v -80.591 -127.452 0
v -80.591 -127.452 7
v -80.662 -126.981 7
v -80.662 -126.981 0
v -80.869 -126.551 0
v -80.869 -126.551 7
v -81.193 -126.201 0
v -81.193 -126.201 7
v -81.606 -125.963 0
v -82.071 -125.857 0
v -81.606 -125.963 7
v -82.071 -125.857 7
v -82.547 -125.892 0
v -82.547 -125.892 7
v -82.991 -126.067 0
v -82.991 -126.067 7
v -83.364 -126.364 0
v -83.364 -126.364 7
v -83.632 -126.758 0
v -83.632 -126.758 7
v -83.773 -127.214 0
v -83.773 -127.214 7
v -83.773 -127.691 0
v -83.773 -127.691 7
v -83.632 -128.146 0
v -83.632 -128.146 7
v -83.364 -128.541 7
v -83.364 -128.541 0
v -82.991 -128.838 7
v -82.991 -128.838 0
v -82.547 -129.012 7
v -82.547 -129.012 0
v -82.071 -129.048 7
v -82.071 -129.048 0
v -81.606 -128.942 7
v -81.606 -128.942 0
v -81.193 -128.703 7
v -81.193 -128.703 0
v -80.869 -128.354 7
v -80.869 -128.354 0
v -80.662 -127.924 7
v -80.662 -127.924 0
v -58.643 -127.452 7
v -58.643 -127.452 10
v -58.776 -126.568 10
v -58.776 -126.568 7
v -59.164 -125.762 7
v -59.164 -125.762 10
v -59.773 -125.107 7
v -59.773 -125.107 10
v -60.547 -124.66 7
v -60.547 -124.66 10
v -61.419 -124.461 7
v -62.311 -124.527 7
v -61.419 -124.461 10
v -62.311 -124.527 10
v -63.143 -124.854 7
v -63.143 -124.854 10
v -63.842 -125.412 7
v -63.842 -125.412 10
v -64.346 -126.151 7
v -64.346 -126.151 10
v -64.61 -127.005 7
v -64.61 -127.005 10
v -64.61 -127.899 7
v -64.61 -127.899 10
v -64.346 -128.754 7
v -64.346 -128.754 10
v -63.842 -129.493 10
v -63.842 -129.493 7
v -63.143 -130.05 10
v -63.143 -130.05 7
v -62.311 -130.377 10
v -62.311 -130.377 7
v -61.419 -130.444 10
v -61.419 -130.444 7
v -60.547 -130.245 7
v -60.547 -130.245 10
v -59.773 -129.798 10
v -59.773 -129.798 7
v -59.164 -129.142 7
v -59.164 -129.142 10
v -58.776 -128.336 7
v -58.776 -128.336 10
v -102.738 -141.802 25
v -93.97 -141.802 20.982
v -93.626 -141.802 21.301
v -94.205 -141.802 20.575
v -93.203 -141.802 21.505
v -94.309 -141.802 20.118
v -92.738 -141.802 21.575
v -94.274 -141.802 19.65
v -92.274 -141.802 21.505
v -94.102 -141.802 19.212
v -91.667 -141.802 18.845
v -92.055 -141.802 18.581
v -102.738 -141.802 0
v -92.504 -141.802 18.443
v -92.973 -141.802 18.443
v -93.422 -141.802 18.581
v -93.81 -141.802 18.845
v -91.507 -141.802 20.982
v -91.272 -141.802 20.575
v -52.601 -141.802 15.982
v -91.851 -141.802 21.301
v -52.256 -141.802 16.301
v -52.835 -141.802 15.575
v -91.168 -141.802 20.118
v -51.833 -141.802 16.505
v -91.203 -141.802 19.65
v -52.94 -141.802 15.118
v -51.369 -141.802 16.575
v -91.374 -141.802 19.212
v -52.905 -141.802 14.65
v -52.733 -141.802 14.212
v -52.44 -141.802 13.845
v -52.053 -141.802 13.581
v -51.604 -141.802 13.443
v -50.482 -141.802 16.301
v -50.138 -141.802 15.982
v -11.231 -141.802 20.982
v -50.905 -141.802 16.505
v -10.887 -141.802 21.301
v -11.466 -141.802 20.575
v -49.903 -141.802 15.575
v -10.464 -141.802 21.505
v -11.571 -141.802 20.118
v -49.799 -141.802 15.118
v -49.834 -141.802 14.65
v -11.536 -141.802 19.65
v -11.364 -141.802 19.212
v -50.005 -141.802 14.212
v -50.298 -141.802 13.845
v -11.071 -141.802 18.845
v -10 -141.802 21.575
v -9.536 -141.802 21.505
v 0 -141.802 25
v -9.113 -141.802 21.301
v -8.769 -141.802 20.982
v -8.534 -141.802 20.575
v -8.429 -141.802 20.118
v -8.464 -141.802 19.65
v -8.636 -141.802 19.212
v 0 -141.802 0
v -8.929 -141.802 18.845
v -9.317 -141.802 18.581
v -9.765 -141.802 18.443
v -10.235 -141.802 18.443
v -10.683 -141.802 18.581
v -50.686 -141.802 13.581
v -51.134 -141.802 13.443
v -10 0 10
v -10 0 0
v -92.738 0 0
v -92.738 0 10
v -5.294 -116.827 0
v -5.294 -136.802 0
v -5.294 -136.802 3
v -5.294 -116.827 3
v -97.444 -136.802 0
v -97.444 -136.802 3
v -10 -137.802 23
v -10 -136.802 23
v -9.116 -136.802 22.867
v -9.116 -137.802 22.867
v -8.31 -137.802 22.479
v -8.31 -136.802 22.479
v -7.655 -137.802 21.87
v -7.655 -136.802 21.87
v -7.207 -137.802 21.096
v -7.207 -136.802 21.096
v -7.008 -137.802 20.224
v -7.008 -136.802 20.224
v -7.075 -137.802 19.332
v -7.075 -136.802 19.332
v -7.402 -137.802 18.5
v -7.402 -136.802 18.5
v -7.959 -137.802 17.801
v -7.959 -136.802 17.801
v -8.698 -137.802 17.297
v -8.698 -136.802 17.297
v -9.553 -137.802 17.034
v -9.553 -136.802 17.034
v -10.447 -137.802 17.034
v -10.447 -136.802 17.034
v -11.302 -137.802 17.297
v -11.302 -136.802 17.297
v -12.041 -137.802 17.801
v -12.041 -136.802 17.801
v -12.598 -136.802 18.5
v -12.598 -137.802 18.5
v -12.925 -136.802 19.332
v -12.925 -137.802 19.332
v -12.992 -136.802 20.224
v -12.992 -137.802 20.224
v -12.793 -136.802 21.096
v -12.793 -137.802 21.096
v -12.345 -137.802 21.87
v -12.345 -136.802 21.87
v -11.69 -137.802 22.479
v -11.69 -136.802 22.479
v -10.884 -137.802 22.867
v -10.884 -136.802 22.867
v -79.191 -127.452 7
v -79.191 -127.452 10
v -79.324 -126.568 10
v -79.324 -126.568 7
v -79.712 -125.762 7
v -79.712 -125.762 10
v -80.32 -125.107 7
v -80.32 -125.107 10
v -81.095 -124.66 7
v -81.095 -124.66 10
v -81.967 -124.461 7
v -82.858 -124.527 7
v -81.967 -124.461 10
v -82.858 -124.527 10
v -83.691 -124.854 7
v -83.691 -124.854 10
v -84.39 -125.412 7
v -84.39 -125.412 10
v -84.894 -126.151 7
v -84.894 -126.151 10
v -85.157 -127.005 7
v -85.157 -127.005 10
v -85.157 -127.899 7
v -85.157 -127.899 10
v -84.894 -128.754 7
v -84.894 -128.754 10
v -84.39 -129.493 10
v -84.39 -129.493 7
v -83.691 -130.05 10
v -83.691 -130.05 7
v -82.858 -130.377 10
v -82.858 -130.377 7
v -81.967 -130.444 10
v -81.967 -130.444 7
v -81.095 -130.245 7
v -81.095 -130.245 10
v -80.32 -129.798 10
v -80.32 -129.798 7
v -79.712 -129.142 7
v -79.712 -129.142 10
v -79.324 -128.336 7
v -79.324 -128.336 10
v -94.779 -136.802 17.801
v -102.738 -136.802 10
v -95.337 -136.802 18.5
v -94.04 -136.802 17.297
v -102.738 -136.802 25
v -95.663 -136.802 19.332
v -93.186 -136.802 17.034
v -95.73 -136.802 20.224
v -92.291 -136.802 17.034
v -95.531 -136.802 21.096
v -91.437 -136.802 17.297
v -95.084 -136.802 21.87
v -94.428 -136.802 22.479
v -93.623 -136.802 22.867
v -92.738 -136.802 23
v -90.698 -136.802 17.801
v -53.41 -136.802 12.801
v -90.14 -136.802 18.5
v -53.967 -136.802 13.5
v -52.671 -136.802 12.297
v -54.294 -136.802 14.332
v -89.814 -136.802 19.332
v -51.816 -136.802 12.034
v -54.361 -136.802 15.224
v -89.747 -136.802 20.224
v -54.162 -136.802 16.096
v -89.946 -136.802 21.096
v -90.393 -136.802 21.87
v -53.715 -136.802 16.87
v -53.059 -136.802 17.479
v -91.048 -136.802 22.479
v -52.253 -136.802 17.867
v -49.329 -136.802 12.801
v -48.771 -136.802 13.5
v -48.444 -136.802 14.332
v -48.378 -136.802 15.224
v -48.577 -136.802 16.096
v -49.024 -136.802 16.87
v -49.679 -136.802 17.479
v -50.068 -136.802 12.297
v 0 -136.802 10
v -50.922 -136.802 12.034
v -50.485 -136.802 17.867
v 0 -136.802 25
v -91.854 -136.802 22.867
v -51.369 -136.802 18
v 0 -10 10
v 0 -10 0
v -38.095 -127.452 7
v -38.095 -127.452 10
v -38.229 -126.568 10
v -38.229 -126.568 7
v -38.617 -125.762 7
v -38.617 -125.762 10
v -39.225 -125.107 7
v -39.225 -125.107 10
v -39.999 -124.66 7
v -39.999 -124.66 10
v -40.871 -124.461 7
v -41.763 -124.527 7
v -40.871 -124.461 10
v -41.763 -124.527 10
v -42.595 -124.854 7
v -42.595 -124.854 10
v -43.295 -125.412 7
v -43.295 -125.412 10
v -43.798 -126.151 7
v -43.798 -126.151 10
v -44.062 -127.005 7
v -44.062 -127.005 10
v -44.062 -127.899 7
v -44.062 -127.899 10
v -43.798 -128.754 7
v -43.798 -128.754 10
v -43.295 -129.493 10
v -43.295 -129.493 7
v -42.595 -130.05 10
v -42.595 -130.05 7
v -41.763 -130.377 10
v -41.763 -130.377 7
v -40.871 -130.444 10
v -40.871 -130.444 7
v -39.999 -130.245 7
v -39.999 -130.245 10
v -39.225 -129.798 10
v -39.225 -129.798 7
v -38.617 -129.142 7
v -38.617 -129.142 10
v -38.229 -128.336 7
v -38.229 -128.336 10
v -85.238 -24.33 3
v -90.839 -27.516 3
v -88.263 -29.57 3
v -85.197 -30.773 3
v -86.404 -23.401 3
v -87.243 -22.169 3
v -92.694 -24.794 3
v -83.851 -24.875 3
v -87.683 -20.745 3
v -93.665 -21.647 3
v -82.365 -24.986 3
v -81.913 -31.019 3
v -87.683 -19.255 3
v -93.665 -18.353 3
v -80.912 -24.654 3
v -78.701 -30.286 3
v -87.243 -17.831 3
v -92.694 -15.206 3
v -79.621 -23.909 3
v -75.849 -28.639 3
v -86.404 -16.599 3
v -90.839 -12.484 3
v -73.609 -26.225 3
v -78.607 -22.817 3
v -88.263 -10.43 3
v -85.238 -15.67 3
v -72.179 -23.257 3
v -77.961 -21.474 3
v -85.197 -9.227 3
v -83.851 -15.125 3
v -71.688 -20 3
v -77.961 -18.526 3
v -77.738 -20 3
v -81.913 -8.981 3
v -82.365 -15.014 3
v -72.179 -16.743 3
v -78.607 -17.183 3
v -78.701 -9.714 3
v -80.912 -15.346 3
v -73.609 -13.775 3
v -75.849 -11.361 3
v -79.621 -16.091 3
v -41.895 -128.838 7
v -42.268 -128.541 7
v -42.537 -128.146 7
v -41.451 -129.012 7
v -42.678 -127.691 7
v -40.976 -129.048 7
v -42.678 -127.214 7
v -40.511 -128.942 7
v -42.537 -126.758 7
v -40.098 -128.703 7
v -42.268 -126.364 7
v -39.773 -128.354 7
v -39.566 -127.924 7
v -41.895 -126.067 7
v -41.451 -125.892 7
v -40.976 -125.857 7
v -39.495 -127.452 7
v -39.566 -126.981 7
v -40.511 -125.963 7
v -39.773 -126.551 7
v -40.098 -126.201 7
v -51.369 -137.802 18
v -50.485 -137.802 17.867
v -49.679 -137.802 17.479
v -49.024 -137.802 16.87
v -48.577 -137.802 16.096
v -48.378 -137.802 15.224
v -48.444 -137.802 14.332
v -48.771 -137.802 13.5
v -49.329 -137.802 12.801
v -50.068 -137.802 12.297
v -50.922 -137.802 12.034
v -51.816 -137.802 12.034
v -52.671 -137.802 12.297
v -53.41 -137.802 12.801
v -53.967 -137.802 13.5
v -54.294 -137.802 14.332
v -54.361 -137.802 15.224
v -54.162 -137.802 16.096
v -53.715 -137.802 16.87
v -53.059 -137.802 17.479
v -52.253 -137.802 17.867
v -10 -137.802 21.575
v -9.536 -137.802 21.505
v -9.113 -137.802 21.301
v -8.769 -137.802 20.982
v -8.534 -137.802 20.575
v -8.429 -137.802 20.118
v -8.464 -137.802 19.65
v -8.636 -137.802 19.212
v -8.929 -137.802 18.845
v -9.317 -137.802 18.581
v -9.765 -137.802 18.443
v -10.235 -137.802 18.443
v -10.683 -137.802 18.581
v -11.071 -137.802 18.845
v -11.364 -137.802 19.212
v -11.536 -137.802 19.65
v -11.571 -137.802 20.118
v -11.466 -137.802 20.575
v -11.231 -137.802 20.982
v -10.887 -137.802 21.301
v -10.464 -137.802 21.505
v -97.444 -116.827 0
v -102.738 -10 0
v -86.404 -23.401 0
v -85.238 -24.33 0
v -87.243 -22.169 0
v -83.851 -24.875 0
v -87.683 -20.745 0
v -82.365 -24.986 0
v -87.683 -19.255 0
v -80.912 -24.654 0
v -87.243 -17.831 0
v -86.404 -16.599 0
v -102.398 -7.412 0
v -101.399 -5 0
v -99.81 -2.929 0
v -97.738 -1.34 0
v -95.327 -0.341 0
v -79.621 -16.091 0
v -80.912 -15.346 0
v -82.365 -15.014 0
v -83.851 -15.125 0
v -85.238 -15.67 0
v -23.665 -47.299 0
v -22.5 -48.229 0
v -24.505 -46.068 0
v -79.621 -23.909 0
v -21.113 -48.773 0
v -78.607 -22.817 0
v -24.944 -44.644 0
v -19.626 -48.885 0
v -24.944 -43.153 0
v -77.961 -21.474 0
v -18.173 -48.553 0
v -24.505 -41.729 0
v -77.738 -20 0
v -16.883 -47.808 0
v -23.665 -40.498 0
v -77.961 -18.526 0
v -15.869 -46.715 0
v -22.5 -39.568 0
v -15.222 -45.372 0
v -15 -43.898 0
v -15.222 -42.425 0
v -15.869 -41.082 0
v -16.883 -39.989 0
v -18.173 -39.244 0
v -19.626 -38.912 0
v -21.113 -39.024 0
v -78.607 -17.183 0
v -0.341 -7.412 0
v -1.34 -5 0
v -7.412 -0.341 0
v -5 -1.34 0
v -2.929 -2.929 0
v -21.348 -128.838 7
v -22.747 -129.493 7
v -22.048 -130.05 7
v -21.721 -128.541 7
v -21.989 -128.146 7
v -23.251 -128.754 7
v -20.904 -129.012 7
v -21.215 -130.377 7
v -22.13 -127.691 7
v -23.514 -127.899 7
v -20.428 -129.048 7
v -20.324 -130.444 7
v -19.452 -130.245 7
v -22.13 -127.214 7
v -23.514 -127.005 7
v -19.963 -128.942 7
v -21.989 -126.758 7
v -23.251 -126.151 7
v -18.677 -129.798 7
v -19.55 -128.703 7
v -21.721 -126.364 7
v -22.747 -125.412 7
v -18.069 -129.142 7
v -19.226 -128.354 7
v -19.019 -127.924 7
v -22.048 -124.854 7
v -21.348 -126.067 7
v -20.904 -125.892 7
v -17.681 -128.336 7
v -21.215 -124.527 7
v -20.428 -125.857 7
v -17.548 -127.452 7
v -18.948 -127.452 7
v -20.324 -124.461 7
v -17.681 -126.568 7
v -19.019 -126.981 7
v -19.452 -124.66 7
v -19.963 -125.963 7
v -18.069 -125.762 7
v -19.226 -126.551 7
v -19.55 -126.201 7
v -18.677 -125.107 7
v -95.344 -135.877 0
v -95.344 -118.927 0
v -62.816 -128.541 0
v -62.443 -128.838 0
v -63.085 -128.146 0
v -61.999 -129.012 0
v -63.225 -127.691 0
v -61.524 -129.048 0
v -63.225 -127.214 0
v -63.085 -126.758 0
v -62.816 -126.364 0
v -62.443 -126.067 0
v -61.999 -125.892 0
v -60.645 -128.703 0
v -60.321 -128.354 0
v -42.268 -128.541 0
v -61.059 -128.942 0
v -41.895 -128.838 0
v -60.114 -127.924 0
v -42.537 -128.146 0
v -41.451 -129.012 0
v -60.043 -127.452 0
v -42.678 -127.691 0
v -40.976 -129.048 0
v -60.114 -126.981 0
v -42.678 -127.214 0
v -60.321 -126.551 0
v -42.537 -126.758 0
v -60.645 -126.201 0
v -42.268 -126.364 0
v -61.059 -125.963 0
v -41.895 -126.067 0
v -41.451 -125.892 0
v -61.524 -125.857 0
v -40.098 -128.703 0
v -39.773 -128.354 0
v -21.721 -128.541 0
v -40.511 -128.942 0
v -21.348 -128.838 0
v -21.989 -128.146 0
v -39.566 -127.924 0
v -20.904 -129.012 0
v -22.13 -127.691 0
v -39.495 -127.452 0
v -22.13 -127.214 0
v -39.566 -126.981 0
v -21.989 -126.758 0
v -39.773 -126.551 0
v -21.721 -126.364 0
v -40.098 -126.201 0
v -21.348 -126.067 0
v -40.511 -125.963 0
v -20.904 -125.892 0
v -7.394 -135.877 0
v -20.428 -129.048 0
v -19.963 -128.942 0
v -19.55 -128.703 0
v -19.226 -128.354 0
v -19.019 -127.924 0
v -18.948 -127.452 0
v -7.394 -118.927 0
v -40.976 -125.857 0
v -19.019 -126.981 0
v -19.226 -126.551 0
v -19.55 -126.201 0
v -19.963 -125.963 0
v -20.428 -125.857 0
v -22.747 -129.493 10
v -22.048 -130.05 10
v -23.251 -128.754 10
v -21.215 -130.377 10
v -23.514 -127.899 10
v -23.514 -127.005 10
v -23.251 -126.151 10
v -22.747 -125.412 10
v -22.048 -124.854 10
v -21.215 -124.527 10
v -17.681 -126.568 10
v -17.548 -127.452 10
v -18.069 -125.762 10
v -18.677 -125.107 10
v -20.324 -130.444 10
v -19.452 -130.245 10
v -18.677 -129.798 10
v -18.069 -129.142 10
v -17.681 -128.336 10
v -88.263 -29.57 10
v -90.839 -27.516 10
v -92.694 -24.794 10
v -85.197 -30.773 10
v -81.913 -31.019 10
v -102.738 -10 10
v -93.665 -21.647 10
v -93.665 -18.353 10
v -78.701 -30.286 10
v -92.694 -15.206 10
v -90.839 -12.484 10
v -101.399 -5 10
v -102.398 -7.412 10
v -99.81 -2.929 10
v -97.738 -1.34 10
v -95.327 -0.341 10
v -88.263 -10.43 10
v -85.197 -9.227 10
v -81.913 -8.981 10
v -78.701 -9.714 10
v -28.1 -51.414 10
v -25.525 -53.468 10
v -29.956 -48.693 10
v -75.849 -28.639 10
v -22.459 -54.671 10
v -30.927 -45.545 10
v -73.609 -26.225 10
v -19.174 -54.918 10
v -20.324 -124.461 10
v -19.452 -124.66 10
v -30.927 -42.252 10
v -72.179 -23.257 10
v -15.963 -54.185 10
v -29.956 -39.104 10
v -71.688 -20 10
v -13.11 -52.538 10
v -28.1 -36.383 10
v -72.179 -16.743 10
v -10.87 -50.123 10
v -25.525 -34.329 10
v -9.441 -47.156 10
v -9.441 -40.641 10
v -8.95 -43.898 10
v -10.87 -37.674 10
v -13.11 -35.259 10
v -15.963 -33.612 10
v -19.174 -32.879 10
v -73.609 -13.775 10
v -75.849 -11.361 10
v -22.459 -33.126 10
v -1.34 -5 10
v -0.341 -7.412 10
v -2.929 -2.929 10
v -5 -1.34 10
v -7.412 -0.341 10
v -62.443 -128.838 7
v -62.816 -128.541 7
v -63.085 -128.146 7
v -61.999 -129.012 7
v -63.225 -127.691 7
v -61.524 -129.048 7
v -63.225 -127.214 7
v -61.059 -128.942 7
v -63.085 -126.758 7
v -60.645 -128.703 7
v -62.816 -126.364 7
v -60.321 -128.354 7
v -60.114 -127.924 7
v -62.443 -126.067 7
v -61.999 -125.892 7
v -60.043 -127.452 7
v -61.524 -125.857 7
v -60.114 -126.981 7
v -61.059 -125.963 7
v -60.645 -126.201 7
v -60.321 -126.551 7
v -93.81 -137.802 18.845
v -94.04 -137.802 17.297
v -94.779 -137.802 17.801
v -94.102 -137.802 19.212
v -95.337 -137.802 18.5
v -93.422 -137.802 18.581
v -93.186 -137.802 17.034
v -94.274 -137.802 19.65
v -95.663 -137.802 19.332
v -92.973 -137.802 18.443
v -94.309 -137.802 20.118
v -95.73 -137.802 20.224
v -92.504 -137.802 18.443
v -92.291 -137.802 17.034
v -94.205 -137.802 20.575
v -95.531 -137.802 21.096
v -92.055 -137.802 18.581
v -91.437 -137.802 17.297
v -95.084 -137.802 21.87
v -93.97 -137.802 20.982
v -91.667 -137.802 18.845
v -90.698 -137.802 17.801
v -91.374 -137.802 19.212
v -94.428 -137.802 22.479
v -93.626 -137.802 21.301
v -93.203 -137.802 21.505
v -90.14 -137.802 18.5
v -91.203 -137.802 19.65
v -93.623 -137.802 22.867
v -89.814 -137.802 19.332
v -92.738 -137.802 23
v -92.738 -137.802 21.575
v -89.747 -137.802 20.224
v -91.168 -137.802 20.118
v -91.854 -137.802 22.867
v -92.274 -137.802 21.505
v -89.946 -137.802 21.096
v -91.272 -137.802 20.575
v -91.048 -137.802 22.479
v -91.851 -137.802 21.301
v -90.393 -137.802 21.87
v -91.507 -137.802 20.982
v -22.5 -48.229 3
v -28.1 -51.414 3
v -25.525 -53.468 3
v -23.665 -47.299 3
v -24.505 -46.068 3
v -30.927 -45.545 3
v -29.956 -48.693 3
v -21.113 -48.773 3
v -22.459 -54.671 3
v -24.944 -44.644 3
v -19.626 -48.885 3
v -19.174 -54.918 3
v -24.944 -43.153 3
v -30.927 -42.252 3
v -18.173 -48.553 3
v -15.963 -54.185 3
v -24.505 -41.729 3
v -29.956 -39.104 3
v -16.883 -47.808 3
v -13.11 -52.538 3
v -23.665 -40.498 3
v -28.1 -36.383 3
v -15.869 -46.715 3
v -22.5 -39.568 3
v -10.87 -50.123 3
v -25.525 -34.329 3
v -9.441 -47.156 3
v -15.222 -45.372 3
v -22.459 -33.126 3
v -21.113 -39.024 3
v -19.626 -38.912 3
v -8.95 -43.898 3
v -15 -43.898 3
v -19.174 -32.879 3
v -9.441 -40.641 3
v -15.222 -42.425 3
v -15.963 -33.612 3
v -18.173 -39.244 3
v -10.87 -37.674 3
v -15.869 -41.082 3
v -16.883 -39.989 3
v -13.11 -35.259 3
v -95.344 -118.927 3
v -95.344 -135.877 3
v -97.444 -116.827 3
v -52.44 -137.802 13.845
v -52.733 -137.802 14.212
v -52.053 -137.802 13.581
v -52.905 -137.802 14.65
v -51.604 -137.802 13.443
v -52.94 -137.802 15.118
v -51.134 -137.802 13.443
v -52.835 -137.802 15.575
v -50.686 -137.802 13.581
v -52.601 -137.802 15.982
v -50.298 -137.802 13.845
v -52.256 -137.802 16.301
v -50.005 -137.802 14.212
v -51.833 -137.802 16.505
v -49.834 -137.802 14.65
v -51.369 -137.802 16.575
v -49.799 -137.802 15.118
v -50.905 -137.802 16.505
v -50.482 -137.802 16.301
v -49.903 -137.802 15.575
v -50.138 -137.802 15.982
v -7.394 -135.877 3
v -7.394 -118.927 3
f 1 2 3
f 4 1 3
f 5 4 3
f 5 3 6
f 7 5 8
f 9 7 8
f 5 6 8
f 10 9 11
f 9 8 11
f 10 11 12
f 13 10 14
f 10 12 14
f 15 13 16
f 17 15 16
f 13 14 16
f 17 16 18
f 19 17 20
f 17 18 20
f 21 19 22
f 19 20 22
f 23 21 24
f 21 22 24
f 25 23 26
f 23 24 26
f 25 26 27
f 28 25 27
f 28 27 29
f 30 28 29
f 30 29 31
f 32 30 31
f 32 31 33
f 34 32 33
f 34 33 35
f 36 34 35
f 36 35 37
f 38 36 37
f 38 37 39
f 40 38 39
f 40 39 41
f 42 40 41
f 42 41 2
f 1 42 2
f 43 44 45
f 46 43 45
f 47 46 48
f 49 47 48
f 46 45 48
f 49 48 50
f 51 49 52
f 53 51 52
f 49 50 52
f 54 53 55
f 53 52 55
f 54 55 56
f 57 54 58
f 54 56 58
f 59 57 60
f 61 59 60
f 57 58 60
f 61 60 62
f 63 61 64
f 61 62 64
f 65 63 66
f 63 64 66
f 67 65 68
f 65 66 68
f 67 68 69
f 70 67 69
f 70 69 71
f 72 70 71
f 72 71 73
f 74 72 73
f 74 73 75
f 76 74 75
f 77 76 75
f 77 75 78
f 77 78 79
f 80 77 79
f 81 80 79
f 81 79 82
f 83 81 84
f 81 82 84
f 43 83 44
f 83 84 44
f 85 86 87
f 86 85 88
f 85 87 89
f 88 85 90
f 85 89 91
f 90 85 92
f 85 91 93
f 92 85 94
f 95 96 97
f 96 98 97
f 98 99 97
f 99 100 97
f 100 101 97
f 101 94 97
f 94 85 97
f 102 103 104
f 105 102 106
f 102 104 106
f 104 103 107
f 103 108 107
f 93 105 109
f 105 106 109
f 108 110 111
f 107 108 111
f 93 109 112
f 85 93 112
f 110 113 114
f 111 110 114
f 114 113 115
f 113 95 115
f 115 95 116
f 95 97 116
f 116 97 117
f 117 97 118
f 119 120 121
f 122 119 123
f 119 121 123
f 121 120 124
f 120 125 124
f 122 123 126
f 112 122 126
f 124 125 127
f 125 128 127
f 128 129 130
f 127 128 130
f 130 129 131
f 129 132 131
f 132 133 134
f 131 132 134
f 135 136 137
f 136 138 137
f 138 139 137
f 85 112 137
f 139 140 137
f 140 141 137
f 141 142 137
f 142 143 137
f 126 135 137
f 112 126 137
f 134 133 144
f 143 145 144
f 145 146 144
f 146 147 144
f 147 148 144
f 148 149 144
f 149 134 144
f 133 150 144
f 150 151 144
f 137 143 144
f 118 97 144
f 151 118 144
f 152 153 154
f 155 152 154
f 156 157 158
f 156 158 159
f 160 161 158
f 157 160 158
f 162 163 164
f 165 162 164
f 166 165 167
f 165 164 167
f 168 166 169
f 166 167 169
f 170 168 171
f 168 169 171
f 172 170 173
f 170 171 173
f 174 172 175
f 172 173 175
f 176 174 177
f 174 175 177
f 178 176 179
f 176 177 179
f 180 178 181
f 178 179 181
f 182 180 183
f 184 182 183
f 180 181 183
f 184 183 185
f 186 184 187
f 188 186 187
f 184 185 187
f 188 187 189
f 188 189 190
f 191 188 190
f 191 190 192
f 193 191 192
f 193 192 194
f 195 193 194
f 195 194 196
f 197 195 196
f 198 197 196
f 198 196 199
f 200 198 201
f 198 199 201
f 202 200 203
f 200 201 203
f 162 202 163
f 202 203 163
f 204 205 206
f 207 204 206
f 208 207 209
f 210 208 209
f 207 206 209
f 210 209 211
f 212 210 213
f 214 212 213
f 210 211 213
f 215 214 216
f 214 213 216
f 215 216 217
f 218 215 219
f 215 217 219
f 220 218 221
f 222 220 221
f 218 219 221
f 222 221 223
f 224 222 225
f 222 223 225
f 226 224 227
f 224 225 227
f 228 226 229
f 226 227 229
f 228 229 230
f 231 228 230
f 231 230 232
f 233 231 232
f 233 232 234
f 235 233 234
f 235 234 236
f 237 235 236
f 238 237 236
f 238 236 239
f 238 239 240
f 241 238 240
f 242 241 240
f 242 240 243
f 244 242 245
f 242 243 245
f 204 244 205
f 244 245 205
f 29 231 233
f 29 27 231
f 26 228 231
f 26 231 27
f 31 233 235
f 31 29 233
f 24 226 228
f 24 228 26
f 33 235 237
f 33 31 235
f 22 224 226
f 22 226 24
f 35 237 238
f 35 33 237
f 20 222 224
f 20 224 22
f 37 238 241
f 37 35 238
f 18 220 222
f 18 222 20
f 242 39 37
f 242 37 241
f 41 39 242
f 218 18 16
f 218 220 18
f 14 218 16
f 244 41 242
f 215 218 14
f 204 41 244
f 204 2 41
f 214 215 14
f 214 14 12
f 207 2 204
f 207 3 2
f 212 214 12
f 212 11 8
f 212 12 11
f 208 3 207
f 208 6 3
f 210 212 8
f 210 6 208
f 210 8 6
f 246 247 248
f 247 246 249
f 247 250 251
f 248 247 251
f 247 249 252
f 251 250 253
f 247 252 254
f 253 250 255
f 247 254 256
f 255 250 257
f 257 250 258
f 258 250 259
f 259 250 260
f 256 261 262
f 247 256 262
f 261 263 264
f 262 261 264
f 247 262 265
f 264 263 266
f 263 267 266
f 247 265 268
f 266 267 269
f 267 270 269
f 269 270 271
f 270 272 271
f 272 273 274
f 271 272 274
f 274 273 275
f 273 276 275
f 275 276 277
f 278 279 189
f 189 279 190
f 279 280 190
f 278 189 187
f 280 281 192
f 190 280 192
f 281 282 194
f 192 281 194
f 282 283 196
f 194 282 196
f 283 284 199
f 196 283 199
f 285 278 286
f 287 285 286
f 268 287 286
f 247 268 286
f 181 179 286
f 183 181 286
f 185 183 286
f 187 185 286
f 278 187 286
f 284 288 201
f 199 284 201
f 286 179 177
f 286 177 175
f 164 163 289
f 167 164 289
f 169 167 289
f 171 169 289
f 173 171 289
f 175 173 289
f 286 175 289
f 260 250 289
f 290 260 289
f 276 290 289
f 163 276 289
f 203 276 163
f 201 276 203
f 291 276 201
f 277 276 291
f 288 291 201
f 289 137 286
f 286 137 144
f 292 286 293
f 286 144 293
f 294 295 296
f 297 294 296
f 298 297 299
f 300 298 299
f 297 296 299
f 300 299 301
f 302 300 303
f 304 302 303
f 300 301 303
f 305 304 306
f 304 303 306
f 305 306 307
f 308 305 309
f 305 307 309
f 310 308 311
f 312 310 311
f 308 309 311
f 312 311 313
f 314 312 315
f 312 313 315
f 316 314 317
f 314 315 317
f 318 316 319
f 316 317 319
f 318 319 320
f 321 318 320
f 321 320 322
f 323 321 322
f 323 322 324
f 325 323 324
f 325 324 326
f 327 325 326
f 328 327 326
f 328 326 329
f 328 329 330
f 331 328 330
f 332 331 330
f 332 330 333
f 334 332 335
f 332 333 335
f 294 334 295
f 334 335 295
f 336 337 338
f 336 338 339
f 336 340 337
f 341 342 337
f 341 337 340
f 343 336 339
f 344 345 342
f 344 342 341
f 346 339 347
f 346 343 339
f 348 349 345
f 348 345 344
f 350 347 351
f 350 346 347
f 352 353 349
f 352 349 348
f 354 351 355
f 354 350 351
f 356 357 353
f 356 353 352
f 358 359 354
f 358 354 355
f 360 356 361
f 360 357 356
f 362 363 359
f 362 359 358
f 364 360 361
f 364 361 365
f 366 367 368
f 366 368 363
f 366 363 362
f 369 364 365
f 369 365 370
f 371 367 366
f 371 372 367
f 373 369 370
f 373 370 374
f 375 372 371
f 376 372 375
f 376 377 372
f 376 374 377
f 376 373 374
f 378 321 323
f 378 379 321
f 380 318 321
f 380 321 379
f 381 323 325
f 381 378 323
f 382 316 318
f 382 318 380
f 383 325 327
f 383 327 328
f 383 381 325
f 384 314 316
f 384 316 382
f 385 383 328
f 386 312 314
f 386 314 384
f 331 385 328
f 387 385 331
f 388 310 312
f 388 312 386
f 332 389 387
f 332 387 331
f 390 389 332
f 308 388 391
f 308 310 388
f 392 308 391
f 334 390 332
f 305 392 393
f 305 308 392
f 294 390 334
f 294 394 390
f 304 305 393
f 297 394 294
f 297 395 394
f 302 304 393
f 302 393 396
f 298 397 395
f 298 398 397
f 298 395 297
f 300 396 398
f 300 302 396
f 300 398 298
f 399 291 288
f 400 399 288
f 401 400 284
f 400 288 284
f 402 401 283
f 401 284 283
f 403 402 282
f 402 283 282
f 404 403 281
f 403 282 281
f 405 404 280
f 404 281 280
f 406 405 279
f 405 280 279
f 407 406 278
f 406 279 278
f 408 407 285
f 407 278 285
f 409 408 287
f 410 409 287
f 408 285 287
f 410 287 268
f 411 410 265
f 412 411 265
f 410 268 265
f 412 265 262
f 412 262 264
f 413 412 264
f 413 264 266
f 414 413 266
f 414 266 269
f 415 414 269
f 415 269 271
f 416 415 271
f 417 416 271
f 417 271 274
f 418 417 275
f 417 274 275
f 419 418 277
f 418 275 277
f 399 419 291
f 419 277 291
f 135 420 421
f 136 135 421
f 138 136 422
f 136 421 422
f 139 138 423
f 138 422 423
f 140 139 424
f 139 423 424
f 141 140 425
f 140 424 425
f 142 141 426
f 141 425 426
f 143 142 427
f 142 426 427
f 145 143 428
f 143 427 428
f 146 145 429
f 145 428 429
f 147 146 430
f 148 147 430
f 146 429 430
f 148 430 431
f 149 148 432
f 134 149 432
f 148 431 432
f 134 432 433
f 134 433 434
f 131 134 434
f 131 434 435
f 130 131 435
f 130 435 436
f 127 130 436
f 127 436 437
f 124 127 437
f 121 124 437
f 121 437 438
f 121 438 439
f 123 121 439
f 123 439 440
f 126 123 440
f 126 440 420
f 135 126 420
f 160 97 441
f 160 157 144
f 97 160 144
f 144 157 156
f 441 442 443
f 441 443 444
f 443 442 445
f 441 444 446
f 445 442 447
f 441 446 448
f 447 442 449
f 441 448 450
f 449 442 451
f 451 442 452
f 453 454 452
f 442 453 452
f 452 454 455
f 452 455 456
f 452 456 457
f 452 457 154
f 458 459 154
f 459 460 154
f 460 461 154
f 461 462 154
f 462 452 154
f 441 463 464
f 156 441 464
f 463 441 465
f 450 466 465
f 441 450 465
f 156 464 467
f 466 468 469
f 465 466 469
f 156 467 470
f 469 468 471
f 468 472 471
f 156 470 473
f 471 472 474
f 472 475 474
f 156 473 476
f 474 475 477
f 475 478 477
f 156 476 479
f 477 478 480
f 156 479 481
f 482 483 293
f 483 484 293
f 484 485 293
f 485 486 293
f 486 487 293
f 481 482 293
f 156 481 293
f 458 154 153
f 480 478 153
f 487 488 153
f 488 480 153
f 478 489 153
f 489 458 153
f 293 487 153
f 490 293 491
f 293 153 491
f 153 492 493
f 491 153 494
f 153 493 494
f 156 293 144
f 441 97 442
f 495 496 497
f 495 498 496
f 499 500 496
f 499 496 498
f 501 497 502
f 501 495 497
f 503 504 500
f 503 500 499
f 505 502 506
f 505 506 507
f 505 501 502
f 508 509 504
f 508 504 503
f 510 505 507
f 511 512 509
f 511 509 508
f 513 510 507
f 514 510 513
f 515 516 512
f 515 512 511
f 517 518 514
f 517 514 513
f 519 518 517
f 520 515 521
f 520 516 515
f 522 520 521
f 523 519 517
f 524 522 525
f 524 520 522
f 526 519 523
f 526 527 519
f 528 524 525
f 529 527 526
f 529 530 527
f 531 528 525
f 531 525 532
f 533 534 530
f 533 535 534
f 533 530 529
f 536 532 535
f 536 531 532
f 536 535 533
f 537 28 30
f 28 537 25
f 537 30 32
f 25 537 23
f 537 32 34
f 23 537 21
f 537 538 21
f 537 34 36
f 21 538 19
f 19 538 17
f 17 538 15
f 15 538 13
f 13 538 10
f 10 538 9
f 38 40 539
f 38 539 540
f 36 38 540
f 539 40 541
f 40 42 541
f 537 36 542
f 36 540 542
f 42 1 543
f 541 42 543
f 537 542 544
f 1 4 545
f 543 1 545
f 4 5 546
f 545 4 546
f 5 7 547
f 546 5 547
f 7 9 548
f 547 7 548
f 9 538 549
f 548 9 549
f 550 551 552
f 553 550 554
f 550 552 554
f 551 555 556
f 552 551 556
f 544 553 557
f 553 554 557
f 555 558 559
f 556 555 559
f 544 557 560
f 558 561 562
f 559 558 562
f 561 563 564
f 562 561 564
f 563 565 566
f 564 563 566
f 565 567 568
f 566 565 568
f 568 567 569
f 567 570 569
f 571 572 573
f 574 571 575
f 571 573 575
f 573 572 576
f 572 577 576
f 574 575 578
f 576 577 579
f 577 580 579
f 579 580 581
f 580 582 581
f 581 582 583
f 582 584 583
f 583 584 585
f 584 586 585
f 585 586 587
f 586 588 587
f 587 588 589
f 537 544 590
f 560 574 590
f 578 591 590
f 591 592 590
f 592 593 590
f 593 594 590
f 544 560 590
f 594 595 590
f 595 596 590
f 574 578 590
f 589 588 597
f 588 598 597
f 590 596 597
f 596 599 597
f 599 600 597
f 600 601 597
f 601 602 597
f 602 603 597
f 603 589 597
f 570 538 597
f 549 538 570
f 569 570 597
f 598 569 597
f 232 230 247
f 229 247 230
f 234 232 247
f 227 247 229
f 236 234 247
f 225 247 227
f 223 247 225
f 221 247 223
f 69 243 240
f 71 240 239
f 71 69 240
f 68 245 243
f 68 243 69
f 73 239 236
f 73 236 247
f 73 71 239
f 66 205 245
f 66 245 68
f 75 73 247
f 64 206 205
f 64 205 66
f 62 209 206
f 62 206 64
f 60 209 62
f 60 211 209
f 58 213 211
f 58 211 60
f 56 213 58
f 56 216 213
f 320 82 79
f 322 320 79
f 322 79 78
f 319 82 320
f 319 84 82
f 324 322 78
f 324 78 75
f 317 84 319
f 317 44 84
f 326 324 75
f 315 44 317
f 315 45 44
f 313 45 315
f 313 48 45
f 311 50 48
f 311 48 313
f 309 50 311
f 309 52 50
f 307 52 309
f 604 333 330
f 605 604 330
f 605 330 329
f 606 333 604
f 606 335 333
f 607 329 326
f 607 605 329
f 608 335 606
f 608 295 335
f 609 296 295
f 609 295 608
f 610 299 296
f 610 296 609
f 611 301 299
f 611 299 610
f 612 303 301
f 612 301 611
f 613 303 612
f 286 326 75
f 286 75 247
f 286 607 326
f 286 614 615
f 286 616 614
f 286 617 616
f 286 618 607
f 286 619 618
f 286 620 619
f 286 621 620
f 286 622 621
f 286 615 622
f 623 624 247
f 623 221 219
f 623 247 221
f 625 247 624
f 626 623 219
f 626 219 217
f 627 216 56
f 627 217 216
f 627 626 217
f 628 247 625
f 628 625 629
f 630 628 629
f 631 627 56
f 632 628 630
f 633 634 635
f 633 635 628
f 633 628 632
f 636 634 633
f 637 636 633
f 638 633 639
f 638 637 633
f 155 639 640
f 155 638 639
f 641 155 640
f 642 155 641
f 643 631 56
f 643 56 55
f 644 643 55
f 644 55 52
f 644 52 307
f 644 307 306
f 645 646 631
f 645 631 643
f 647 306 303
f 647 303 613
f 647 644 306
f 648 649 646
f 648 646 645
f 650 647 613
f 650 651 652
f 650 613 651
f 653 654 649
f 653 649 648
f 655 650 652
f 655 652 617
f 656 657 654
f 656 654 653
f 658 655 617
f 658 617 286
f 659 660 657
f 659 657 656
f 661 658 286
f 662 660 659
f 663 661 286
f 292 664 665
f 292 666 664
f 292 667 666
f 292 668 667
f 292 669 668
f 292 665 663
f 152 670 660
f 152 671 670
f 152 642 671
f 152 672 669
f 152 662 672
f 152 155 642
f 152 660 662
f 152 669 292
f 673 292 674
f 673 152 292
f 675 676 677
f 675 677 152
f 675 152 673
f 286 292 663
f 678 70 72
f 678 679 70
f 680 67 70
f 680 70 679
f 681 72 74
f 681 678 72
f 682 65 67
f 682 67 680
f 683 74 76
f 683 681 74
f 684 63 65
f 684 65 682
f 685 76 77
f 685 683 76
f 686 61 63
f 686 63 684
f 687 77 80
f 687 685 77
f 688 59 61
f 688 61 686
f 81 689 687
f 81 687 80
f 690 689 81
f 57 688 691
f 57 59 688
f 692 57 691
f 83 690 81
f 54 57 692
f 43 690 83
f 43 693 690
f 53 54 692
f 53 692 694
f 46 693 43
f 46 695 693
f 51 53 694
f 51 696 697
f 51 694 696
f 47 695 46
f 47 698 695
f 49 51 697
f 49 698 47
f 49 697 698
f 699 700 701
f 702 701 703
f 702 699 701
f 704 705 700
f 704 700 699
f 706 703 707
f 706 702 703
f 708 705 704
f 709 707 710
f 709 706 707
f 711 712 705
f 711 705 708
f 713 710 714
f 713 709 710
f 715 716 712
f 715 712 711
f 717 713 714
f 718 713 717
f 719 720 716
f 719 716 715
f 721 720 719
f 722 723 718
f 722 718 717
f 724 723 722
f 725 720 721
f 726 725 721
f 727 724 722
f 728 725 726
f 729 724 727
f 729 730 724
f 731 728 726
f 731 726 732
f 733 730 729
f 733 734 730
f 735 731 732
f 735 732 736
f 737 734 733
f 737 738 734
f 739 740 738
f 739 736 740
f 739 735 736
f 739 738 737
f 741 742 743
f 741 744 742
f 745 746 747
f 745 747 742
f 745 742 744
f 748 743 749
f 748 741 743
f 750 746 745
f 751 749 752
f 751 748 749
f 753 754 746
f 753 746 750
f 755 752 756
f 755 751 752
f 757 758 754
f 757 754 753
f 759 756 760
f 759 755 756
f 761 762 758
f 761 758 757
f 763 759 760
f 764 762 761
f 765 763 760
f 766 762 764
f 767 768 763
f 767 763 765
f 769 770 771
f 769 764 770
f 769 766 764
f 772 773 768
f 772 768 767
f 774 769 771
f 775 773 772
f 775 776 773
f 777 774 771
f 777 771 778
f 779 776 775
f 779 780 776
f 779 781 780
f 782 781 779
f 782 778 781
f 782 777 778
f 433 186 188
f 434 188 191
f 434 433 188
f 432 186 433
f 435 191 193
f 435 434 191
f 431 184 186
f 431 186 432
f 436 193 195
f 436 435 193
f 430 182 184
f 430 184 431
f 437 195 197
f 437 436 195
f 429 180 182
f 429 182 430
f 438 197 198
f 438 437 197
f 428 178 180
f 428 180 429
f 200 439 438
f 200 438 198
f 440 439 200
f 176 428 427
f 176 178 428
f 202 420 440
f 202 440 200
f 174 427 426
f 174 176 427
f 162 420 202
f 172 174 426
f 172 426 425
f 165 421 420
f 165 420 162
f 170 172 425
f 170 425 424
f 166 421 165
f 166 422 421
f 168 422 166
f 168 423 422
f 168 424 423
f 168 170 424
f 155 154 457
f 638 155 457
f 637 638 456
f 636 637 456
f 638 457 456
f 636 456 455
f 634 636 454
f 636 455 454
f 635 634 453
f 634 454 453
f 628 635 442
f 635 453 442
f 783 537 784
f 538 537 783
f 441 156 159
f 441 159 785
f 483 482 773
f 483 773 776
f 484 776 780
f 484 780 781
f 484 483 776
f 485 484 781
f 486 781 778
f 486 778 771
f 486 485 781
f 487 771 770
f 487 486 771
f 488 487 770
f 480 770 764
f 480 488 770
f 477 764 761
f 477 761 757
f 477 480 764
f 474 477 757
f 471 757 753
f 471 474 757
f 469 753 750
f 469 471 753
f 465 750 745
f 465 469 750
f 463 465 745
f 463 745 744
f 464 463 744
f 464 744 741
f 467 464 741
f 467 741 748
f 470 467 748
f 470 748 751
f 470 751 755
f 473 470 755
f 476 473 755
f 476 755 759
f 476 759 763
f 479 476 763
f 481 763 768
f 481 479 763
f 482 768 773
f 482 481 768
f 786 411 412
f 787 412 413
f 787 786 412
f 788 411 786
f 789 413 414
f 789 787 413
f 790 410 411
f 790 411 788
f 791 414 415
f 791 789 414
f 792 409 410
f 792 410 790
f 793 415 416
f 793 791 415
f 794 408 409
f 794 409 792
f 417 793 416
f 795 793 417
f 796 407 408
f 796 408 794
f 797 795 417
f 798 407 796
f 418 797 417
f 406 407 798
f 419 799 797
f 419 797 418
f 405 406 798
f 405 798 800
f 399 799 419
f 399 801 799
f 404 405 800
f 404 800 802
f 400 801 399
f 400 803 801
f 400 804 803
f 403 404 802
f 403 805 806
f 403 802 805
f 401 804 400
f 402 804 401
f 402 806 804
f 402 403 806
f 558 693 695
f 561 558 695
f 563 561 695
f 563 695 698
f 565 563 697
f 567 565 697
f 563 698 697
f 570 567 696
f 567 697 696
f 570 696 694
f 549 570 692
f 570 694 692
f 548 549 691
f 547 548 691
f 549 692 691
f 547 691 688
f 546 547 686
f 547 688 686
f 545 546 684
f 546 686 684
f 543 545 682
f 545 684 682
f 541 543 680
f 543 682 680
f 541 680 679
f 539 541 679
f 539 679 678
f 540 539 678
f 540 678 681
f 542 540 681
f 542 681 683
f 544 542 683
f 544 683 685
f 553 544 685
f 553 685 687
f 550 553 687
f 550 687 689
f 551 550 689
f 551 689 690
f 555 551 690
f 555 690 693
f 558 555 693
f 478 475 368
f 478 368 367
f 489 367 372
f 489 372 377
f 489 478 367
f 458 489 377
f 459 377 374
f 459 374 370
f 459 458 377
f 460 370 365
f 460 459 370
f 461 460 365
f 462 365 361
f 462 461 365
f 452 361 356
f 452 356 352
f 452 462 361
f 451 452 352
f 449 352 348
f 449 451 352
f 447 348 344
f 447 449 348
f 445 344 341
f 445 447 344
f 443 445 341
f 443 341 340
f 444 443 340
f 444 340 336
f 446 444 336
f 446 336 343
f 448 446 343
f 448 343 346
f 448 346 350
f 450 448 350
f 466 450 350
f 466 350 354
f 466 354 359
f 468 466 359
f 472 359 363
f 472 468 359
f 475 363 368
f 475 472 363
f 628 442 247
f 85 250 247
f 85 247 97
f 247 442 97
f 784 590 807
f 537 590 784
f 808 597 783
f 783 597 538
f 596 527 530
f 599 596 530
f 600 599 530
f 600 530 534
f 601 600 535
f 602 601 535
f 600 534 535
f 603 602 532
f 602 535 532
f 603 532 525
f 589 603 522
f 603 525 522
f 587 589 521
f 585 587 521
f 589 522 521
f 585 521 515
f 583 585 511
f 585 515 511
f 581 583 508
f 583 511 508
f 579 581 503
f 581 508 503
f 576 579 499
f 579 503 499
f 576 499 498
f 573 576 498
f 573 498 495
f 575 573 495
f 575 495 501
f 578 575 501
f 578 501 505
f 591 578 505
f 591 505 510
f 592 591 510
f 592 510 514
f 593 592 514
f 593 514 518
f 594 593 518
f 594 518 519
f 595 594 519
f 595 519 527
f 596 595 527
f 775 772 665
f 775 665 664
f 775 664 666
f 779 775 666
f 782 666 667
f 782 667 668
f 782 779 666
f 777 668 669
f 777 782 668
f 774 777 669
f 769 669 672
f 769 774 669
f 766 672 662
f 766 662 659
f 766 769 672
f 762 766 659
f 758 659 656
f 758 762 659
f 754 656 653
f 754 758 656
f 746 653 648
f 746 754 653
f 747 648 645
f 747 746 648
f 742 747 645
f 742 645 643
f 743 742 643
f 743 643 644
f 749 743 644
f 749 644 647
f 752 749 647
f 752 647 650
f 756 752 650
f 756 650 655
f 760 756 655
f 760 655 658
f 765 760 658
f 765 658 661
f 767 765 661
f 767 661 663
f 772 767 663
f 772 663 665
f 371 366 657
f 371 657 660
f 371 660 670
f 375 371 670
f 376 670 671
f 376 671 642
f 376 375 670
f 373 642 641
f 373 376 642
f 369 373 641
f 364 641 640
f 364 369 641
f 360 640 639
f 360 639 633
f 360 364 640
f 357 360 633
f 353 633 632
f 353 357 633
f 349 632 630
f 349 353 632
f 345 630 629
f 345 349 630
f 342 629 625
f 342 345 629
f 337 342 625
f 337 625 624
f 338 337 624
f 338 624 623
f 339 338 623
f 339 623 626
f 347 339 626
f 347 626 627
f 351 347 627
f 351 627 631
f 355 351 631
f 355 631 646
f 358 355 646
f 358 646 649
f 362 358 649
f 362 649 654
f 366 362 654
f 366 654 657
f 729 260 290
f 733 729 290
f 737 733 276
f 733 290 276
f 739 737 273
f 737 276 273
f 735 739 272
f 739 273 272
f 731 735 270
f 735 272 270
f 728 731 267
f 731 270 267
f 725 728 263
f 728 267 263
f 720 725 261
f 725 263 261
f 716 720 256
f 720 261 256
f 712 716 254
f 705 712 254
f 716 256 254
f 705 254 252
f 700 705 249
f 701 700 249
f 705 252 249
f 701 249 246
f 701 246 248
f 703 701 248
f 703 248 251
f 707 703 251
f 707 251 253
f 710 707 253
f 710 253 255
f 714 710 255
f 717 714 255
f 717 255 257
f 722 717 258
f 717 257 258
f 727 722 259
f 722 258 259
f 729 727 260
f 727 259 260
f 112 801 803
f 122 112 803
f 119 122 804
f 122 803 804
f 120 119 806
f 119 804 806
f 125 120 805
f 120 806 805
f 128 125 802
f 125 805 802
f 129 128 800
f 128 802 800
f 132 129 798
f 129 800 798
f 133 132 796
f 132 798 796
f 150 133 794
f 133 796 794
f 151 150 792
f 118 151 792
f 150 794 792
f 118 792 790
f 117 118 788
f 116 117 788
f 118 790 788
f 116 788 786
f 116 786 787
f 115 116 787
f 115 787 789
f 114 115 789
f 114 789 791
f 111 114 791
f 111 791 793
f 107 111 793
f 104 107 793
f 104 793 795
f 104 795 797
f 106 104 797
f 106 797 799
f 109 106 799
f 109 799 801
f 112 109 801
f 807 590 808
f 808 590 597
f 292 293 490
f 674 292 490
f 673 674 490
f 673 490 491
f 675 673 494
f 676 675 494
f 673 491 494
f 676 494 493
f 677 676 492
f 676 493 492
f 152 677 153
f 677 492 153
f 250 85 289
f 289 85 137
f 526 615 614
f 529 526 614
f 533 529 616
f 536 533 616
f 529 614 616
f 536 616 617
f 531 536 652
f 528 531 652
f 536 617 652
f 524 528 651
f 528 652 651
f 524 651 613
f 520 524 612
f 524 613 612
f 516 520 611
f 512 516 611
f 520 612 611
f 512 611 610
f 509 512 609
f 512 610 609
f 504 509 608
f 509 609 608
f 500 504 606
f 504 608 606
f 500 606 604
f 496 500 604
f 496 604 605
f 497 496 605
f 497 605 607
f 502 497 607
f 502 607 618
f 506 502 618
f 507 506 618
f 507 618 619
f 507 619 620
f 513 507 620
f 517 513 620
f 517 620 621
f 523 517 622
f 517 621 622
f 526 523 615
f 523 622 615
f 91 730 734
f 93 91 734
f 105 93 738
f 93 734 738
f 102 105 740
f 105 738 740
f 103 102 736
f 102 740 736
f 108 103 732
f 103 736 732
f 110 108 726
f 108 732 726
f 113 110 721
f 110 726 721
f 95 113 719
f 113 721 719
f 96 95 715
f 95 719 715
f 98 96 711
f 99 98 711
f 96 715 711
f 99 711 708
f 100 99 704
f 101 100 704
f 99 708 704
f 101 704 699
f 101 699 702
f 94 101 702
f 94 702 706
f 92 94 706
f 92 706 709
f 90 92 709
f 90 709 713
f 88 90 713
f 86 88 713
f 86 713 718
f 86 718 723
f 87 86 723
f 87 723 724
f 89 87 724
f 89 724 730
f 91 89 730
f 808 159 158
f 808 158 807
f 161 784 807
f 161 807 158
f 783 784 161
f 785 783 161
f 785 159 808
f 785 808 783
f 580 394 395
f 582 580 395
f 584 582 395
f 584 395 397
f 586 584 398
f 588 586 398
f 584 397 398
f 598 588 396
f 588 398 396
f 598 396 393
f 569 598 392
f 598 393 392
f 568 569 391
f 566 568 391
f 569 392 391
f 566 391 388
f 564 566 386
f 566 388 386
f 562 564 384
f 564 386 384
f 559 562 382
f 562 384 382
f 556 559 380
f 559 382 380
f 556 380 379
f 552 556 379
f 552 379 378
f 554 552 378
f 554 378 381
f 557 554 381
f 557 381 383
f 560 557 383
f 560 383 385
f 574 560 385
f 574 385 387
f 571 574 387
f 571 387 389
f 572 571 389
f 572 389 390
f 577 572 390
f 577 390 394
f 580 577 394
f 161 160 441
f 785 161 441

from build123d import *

# Parameters (mm, degrees)
SKETCH2_R           = 11.05
BOSS_EXTRUDE2_DEPTH = 10
SKETCH2_4_R         = 11.05
SKETCH2_4_R_2       = 5
BOSS_EXTRUDE3_DEPTH = 3
SKETCH4_R           = 1.6
CUT_EXTRUDE3_DEPTH  = 10
SKETCH4_5_R         = 3
SKETCH4_5_R_2       = 1.6
CUT_EXTRUDE4_DEPTH  = 3
SKETCH5_W           = 92.15
SKETCH5_H           = 21.15
SKETCH5_W_2         = 87.95
SKETCH5_H_2         = 16.95
CUT_EXTRUDE5_DEPTH  = 3
SKETCH6_W           = 102.73844499
SKETCH6_H           = 25
BOSS_EXTRUDE4_DEPTH = 5
SKETCH7_R           = 1.575
CUT_EXTRUDE6_DEPTH  = 5
SKETCH7_3_R         = 3
SKETCH7_3_R_2       = 1.575
CUT_EXTRUDE7_DEPTH  = 1


with BuildPart() as part:
    # Sketch2 → Boss-Extrude2 (new body)
    with BuildSketch(Plane.XY):
        with BuildLine():
            ThreePointArc((0, -10), (-2.928932188, -2.928932188), (-10, 0))
            Line((-10, 0), (-92.73844499, 0))
            ThreePointArc((-92.73844499, 0), (-99.809512802, -2.928932188), (-102.73844499, -10))
            Line((-102.73844499, -10), (-102.73844499, -141.80223365))
            Line((-102.73844499, -141.80223365), (0, -141.80223365))
            Line((0, -141.80223365), (0, -10))
        make_face()
        with Locations((-82.73844499, -20)):
            Circle(SKETCH2_R, mode=Mode.SUBTRACT)
        with Locations((-20, -43.89848365)):
            Circle(SKETCH2_R, mode=Mode.SUBTRACT)
    extrude(amount=BOSS_EXTRUDE2_DEPTH)

    # Sketch2<4> → Boss-Extrude3 (add)
    # profile 1 of 2: a face of its own
    with BuildSketch(Plane.XY):
        with Locations((-82.73844499, -20)):
            Circle(SKETCH2_4_R)
        with Locations((-82.73844499, -20)):
            Circle(SKETCH2_4_R_2, mode=Mode.SUBTRACT)
    # profile 2 of 2: a face of its own
    with BuildSketch(Plane.XY):
        with Locations((-20, -43.89848365)):
            Circle(SKETCH2_4_R)
        with Locations((-20, -43.89848365)):
            Circle(SKETCH2_4_R_2, mode=Mode.SUBTRACT)
    extrude(amount=BOSS_EXTRUDE3_DEPTH)

    # Sketch4 → Cut-Extrude3 (cut)
    with BuildSketch(Plane.XY.offset(10)):
        with Locations((-82.19075699, -127.45223365)):
            Circle(SKETCH4_R)
        with Locations((-61.64306899, -127.45223365)):
            Circle(SKETCH4_R)
        with Locations((-41.09538099, -127.45223365)):
            Circle(SKETCH4_R)
        with Locations((-20.54769299, -127.45223365)):
            Circle(SKETCH4_R)
    extrude(amount=-CUT_EXTRUDE3_DEPTH, mode=Mode.SUBTRACT)

    # Sketch4<5> → Cut-Extrude4 (cut)
    # profile 1 of 4: a face of its own
    with BuildSketch(Plane.XY.offset(10)):
        with Locations((-82.19075699, -127.45223365)):
            Circle(SKETCH4_5_R)
        with Locations((-82.19075699, -127.45223365)):
            Circle(SKETCH4_5_R_2, mode=Mode.SUBTRACT)
    # profile 2 of 4: a face of its own
    with BuildSketch(Plane.XY.offset(10)):
        with Locations((-61.64306899, -127.45223365)):
            Circle(SKETCH4_5_R)
        with Locations((-61.64306899, -127.45223365)):
            Circle(SKETCH4_5_R_2, mode=Mode.SUBTRACT)
    # profile 3 of 4: a face of its own
    with BuildSketch(Plane.XY.offset(10)):
        with Locations((-41.09538099, -127.45223365)):
            Circle(SKETCH4_5_R)
        with Locations((-41.09538099, -127.45223365)):
            Circle(SKETCH4_5_R_2, mode=Mode.SUBTRACT)
    # profile 4 of 4: a face of its own
    with BuildSketch(Plane.XY.offset(10)):
        with Locations((-20.54769299, -127.45223365)):
            Circle(SKETCH4_5_R)
        with Locations((-20.54769299, -127.45223365)):
            Circle(SKETCH4_5_R_2, mode=Mode.SUBTRACT)
    extrude(amount=-CUT_EXTRUDE4_DEPTH, mode=Mode.SUBTRACT)

    # Sketch5 → Cut-Extrude5 (cut)
    with BuildSketch(Plane(origin=(0, 0, 0), x_dir=(-1, 0, 0), z_dir=(0, 0, -1))):
        with Locations((51.369222495, -127.40223365)):
            Rectangle(SKETCH5_W, SKETCH5_H)
        with Locations((51.369222495, -127.40223365)):
            Rectangle(SKETCH5_W_2, SKETCH5_H_2, mode=Mode.SUBTRACT)
    extrude(amount=-CUT_EXTRUDE5_DEPTH, mode=Mode.SUBTRACT)

    # Sketch6 → Boss-Extrude4 (add)
    with BuildSketch(Plane.XZ.offset(141.80223365)):
        with Locations((-51.369222495, 12.5)):
            Rectangle(SKETCH6_W, SKETCH6_H)
    extrude(amount=-BOSS_EXTRUDE4_DEPTH)

    # Sketch7 → Cut-Extrude6 (cut)
    with BuildSketch(Plane(origin=(0, -136.80223365, 0), x_dir=(1, 0, 0), z_dir=(0, 1, 0))):
        with Locations((-92.73844499, -20)):
            Circle(SKETCH7_R)
        with Locations((-51.369222495, -15)):
            Circle(SKETCH7_R)
        with Locations((-10, -20)):
            Circle(SKETCH7_R)
    extrude(amount=-CUT_EXTRUDE6_DEPTH, mode=Mode.SUBTRACT)

    # Sketch7<3> → Cut-Extrude7 (cut)
    # profile 1 of 3: a face of its own
    with BuildSketch(Plane(origin=(0, -136.80223365, 0), x_dir=(1, 0, 0), z_dir=(0, 1, 0))):
        with Locations((-92.73844499, -20)):
            Circle(SKETCH7_3_R)
        with Locations((-92.73844499, -20)):
            Circle(SKETCH7_3_R_2, mode=Mode.SUBTRACT)
    # profile 2 of 3: a face of its own
    with BuildSketch(Plane(origin=(0, -136.80223365, 0), x_dir=(1, 0, 0), z_dir=(0, 1, 0))):
        with Locations((-51.369222495, -15)):
            Circle(SKETCH7_3_R)
        with Locations((-51.369222495, -15)):
            Circle(SKETCH7_3_R_2, mode=Mode.SUBTRACT)
    # profile 3 of 3: a face of its own
    with BuildSketch(Plane(origin=(0, -136.80223365, 0), x_dir=(1, 0, 0), z_dir=(0, 1, 0))):
        with Locations((-10, -20)):
            Circle(SKETCH7_3_R)
        with Locations((-10, -20)):
            Circle(SKETCH7_3_R_2, mode=Mode.SUBTRACT)
    extrude(amount=-CUT_EXTRUDE7_DEPTH, mode=Mode.SUBTRACT)


solid = part.part
